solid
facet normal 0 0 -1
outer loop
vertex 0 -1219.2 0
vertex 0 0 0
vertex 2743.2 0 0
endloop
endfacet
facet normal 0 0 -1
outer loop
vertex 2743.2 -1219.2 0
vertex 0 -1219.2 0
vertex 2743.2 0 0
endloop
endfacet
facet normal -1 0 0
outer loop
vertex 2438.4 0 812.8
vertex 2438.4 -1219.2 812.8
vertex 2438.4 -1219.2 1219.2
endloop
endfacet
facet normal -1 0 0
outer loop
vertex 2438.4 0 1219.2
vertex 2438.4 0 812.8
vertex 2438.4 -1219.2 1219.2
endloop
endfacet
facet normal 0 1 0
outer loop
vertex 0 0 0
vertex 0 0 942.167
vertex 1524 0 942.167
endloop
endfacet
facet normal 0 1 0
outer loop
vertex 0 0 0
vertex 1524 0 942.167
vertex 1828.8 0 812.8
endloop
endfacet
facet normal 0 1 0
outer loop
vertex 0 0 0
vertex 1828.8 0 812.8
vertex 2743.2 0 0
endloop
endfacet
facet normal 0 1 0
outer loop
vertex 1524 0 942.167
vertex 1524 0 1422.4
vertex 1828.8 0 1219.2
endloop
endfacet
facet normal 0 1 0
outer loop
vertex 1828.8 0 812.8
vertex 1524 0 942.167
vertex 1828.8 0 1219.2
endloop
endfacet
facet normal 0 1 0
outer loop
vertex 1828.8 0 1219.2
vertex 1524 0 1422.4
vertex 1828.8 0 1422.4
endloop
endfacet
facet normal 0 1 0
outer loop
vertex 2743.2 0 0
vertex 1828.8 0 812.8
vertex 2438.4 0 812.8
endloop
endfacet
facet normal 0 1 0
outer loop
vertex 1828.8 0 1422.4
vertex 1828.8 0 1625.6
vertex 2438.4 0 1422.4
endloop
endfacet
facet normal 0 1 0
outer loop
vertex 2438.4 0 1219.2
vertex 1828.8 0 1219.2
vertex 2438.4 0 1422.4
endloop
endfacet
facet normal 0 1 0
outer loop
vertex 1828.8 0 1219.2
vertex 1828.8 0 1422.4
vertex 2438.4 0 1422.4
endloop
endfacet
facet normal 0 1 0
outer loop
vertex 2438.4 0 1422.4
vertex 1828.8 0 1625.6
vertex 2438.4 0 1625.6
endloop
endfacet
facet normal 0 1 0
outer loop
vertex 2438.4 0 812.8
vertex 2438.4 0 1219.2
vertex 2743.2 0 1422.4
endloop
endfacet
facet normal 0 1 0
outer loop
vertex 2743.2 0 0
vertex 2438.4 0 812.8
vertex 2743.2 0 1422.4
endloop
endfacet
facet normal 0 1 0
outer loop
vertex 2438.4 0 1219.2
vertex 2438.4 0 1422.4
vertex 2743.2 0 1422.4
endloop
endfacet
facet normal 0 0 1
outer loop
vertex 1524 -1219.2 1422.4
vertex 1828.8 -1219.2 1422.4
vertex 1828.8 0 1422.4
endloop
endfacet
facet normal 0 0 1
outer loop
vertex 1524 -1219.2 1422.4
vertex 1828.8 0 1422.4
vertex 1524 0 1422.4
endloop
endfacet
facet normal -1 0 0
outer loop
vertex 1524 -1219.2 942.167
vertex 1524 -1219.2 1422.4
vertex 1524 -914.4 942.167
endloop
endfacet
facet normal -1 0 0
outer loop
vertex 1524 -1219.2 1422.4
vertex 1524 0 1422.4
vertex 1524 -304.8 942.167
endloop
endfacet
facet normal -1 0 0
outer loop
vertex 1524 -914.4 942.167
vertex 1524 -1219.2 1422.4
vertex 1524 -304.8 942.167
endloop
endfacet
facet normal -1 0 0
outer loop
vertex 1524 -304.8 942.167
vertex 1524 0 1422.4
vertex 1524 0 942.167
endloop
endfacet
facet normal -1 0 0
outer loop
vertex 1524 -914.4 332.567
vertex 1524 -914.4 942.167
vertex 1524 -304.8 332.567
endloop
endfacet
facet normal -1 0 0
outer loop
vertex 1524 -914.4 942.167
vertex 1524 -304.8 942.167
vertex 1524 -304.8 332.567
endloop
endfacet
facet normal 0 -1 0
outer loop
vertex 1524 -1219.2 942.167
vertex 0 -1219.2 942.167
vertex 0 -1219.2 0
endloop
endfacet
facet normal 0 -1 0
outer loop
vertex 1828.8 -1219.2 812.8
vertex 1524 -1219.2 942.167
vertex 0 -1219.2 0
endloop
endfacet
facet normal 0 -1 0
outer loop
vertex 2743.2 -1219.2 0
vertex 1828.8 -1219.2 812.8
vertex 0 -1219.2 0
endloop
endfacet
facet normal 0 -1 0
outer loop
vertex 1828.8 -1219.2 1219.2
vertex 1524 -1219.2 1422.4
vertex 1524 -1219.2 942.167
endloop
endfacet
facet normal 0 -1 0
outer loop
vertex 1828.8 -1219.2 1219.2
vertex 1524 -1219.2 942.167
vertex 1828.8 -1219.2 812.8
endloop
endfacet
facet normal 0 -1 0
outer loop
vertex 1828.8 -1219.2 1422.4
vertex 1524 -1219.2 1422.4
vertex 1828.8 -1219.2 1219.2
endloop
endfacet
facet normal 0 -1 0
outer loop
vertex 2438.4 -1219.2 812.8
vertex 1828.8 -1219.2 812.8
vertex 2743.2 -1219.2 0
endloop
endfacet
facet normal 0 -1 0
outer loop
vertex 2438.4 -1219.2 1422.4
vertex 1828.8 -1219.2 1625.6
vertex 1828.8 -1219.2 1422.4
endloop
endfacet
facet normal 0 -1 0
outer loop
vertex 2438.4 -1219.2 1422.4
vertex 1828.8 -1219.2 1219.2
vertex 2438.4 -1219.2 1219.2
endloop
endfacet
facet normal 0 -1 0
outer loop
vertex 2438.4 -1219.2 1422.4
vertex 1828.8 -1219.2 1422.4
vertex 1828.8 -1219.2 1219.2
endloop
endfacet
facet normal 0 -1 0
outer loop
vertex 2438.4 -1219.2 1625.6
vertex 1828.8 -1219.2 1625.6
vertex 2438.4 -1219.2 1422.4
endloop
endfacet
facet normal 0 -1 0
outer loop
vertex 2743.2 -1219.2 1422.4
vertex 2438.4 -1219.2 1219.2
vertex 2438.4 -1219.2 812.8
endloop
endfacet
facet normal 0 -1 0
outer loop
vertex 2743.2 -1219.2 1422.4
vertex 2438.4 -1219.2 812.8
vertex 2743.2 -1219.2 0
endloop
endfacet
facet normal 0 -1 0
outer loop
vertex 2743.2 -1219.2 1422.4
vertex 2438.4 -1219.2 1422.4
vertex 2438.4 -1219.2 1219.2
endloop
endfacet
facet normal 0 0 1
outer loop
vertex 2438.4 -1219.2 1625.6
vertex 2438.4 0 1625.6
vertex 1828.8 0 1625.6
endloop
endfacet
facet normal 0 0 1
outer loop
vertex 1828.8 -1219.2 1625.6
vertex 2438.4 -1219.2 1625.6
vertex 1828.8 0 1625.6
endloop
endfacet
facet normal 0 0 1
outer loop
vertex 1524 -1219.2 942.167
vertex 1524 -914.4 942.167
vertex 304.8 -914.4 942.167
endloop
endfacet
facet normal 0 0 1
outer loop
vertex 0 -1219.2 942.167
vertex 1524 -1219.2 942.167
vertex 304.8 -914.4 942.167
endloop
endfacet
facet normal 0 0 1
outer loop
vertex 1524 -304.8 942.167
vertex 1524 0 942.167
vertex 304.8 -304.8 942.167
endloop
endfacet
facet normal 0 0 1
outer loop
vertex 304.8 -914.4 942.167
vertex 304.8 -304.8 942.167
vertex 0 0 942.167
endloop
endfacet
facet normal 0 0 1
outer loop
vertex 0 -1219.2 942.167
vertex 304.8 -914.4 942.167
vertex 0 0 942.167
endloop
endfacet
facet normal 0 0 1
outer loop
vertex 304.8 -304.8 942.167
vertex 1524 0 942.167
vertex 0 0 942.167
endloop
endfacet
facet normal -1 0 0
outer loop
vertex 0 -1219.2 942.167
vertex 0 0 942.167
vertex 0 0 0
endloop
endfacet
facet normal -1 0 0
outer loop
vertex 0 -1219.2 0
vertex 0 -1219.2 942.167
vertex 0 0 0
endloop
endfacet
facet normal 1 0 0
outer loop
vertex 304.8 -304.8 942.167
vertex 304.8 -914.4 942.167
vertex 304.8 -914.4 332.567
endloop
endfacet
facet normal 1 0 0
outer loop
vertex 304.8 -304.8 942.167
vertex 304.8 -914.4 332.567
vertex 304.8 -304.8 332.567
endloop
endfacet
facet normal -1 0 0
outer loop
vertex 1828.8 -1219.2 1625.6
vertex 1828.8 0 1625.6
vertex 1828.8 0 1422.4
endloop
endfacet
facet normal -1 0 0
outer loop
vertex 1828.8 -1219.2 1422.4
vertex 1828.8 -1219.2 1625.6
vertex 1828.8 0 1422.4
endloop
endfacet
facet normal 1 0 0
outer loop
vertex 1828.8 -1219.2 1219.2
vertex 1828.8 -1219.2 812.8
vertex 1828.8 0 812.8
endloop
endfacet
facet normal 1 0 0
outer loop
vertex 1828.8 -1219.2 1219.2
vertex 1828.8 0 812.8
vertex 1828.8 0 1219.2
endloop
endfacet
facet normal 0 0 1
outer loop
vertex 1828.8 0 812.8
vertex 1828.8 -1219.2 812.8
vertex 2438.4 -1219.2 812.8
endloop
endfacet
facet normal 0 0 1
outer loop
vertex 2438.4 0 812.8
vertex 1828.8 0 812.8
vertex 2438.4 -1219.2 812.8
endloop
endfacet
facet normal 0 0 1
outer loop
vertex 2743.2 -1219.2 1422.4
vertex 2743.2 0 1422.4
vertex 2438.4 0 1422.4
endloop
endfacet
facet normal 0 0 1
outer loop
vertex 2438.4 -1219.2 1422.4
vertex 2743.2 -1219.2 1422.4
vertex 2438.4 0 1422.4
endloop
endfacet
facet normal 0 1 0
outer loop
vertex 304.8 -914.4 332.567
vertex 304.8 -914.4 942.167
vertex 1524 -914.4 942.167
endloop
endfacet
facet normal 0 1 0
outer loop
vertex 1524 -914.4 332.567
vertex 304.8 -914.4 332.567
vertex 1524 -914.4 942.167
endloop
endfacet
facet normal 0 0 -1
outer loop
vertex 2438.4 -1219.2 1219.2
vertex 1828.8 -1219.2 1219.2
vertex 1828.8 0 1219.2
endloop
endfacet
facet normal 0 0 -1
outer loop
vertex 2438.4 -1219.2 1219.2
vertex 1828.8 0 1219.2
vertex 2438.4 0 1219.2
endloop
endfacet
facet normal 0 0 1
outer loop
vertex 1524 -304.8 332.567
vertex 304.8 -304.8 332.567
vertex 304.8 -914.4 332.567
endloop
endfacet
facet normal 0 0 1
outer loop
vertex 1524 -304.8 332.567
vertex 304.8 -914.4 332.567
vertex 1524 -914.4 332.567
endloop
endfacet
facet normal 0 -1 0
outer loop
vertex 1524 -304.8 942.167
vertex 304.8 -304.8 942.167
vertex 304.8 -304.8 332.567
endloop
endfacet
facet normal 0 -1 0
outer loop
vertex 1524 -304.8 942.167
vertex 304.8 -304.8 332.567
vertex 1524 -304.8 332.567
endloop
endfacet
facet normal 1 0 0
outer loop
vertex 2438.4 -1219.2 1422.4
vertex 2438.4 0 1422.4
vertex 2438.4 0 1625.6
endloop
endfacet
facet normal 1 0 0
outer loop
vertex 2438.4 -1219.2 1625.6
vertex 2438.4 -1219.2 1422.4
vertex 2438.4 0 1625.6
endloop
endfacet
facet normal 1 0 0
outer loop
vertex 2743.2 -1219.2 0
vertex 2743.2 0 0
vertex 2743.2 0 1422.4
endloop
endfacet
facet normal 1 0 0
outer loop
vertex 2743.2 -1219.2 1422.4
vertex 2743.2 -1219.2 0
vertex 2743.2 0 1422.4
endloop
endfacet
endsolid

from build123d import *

# Parameters (mm, degrees)
F1_DEPTH = 1219.2
F2_W     = 1219.2
F2_H     = 609.6
F3_DEPTH = 609.6
F4_W     = 609.6
F4_H     = 406.4
F5_DEPTH = 1219.2


with BuildPart() as f1:
    # F0 (on Front) → F1 (new body)
    with BuildSketch(Plane.XZ):
        Polygon((0, 942.166507), (0, 0), (2743.2, 0), (2743.2, 1422.4), (2438.4, 1422.4), (2438.4, 1625.6), (1828.8, 1625.6), (1828.8, 1422.4), (1524, 1422.4), (1524, 1201.297045), (1524, 1117.6), (1524, 942.166507), align=None)
    extrude(amount=F1_DEPTH)

    # F2 (on face) → F3 (cut)
    with BuildSketch(Plane.XY.offset(942.166507)):
        with Locations((914.4, -609.6)):
            Rectangle(F2_W, F2_H)
    extrude(amount=-F3_DEPTH, mode=Mode.SUBTRACT)

    # F4 (on face) → F5 (cut)
    with BuildSketch(Plane.XZ.offset(1219.2)):
        with Locations((2133.6, 1016)):
            Rectangle(F4_W, F4_H)
    extrude(amount=-F5_DEPTH, mode=Mode.SUBTRACT)


solid = f1.part
